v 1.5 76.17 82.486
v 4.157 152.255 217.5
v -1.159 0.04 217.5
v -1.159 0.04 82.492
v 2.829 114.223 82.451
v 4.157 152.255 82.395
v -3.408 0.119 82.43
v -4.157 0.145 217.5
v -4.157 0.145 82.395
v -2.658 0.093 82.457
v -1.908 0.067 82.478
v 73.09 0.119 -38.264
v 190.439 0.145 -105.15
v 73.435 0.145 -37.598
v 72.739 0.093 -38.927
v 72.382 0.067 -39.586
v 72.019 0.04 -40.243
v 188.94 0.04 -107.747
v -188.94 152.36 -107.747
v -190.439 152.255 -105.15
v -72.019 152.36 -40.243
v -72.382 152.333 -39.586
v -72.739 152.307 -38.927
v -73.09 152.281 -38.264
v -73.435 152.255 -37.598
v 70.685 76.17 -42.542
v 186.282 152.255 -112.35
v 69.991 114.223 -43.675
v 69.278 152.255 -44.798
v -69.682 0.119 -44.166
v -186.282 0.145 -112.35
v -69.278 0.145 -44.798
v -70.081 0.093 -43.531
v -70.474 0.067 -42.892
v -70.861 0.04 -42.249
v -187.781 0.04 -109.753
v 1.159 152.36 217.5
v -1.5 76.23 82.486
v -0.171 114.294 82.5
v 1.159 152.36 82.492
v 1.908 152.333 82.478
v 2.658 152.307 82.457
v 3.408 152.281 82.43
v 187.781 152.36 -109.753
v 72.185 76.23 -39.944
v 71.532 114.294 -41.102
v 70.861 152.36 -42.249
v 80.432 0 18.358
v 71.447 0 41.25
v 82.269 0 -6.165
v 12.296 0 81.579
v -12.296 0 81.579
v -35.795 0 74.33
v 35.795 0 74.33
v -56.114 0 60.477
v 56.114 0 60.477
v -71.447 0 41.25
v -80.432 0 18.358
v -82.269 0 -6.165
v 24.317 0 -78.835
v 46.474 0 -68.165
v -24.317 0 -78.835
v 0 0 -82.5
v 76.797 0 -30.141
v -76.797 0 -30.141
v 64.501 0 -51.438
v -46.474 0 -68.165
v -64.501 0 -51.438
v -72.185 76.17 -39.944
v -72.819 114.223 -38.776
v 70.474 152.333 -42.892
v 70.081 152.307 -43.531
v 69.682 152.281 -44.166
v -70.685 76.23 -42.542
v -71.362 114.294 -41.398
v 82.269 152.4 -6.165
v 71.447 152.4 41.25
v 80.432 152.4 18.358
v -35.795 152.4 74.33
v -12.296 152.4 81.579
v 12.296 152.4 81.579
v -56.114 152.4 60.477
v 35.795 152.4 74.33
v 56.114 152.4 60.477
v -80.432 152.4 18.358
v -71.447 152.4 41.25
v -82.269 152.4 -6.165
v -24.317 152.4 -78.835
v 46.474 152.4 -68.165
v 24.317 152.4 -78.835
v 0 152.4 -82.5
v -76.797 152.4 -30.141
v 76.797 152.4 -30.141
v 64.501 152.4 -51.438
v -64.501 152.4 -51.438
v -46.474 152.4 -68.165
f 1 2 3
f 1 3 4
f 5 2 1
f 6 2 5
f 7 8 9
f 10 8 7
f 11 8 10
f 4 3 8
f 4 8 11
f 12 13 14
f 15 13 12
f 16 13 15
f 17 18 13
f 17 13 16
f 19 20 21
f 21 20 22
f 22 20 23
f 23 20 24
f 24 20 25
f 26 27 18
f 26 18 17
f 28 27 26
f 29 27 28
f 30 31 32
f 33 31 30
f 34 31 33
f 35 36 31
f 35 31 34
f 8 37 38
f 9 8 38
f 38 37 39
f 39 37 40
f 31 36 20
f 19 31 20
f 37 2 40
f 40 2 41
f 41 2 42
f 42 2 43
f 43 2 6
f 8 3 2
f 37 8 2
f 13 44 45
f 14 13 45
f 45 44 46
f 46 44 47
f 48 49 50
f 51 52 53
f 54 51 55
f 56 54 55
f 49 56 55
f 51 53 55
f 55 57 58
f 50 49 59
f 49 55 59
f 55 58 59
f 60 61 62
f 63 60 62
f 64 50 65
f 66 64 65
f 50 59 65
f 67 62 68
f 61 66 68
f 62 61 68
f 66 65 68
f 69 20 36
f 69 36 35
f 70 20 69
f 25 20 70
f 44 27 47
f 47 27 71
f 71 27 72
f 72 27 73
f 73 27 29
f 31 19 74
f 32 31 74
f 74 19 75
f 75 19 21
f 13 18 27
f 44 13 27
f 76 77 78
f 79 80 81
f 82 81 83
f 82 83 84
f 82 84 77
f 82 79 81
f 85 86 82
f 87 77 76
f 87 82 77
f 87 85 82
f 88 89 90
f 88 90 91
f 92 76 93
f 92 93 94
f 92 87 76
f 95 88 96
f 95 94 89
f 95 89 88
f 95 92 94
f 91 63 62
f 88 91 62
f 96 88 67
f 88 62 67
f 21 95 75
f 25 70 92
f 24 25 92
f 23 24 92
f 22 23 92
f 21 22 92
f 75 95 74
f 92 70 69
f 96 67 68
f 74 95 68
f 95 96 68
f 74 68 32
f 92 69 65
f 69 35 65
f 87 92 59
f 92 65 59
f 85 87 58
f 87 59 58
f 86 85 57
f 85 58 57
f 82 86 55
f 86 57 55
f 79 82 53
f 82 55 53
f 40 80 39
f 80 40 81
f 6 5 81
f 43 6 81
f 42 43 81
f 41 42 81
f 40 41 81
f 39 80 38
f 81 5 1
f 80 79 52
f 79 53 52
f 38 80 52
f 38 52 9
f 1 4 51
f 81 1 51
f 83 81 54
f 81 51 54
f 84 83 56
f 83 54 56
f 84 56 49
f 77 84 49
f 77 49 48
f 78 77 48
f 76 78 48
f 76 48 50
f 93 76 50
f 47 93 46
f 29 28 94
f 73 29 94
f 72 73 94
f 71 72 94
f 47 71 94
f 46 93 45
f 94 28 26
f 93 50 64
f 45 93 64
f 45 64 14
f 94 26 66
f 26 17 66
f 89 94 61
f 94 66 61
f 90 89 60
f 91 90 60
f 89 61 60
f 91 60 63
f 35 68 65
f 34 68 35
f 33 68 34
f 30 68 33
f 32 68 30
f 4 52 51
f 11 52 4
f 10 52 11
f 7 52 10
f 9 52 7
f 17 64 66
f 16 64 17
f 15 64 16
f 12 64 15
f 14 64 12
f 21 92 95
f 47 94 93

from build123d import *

# Parameters (mm, degrees)
SKETCH1_R           = 82.5
BOSS_EXTRUDE1_DEPTH = 152.4
SKETCH3_W           = 217.5
SKETCH3_H           = 152.307162038
BOSS_EXTRUDE2_DEPTH = 1.5
CIRPATTERN1_COUNT   = 3


with BuildPart() as part:
    # Sketch1 → Boss-Extrude1 (new body)
    with BuildSketch(Plane(origin=(0, 0, 0), x_dir=(1, 0, 0), z_dir=(0, 1, 0))):
        Circle(SKETCH1_R)
    extrude(amount=BOSS_EXTRUDE1_DEPTH)

    # Sketch3 → Boss-Extrude2 (add, symmetric)
    with BuildSketch(Plane(origin=(-2.65772165, 0.092809685, 0), x_dir=(0, 0, -1), z_dir=(0.9993908270190958, -0.03489949670250104, 0))):
        with Locations((-108.75, 76.153581019)):
            Rectangle(SKETCH3_W, SKETCH3_H)
    boss_extrude2 = extrude(amount=BOSS_EXTRUDE2_DEPTH, both=True)

    # CirPattern1: Boss-Extrude2 ×3 about axis
    cirpattern1_axis = Axis((0, 152.4, 0), (0, -1, 0))
    for i in range(1, CIRPATTERN1_COUNT):
        add(boss_extrude2.rotate(cirpattern1_axis, i * 360 / CIRPATTERN1_COUNT))


solid = part.part
